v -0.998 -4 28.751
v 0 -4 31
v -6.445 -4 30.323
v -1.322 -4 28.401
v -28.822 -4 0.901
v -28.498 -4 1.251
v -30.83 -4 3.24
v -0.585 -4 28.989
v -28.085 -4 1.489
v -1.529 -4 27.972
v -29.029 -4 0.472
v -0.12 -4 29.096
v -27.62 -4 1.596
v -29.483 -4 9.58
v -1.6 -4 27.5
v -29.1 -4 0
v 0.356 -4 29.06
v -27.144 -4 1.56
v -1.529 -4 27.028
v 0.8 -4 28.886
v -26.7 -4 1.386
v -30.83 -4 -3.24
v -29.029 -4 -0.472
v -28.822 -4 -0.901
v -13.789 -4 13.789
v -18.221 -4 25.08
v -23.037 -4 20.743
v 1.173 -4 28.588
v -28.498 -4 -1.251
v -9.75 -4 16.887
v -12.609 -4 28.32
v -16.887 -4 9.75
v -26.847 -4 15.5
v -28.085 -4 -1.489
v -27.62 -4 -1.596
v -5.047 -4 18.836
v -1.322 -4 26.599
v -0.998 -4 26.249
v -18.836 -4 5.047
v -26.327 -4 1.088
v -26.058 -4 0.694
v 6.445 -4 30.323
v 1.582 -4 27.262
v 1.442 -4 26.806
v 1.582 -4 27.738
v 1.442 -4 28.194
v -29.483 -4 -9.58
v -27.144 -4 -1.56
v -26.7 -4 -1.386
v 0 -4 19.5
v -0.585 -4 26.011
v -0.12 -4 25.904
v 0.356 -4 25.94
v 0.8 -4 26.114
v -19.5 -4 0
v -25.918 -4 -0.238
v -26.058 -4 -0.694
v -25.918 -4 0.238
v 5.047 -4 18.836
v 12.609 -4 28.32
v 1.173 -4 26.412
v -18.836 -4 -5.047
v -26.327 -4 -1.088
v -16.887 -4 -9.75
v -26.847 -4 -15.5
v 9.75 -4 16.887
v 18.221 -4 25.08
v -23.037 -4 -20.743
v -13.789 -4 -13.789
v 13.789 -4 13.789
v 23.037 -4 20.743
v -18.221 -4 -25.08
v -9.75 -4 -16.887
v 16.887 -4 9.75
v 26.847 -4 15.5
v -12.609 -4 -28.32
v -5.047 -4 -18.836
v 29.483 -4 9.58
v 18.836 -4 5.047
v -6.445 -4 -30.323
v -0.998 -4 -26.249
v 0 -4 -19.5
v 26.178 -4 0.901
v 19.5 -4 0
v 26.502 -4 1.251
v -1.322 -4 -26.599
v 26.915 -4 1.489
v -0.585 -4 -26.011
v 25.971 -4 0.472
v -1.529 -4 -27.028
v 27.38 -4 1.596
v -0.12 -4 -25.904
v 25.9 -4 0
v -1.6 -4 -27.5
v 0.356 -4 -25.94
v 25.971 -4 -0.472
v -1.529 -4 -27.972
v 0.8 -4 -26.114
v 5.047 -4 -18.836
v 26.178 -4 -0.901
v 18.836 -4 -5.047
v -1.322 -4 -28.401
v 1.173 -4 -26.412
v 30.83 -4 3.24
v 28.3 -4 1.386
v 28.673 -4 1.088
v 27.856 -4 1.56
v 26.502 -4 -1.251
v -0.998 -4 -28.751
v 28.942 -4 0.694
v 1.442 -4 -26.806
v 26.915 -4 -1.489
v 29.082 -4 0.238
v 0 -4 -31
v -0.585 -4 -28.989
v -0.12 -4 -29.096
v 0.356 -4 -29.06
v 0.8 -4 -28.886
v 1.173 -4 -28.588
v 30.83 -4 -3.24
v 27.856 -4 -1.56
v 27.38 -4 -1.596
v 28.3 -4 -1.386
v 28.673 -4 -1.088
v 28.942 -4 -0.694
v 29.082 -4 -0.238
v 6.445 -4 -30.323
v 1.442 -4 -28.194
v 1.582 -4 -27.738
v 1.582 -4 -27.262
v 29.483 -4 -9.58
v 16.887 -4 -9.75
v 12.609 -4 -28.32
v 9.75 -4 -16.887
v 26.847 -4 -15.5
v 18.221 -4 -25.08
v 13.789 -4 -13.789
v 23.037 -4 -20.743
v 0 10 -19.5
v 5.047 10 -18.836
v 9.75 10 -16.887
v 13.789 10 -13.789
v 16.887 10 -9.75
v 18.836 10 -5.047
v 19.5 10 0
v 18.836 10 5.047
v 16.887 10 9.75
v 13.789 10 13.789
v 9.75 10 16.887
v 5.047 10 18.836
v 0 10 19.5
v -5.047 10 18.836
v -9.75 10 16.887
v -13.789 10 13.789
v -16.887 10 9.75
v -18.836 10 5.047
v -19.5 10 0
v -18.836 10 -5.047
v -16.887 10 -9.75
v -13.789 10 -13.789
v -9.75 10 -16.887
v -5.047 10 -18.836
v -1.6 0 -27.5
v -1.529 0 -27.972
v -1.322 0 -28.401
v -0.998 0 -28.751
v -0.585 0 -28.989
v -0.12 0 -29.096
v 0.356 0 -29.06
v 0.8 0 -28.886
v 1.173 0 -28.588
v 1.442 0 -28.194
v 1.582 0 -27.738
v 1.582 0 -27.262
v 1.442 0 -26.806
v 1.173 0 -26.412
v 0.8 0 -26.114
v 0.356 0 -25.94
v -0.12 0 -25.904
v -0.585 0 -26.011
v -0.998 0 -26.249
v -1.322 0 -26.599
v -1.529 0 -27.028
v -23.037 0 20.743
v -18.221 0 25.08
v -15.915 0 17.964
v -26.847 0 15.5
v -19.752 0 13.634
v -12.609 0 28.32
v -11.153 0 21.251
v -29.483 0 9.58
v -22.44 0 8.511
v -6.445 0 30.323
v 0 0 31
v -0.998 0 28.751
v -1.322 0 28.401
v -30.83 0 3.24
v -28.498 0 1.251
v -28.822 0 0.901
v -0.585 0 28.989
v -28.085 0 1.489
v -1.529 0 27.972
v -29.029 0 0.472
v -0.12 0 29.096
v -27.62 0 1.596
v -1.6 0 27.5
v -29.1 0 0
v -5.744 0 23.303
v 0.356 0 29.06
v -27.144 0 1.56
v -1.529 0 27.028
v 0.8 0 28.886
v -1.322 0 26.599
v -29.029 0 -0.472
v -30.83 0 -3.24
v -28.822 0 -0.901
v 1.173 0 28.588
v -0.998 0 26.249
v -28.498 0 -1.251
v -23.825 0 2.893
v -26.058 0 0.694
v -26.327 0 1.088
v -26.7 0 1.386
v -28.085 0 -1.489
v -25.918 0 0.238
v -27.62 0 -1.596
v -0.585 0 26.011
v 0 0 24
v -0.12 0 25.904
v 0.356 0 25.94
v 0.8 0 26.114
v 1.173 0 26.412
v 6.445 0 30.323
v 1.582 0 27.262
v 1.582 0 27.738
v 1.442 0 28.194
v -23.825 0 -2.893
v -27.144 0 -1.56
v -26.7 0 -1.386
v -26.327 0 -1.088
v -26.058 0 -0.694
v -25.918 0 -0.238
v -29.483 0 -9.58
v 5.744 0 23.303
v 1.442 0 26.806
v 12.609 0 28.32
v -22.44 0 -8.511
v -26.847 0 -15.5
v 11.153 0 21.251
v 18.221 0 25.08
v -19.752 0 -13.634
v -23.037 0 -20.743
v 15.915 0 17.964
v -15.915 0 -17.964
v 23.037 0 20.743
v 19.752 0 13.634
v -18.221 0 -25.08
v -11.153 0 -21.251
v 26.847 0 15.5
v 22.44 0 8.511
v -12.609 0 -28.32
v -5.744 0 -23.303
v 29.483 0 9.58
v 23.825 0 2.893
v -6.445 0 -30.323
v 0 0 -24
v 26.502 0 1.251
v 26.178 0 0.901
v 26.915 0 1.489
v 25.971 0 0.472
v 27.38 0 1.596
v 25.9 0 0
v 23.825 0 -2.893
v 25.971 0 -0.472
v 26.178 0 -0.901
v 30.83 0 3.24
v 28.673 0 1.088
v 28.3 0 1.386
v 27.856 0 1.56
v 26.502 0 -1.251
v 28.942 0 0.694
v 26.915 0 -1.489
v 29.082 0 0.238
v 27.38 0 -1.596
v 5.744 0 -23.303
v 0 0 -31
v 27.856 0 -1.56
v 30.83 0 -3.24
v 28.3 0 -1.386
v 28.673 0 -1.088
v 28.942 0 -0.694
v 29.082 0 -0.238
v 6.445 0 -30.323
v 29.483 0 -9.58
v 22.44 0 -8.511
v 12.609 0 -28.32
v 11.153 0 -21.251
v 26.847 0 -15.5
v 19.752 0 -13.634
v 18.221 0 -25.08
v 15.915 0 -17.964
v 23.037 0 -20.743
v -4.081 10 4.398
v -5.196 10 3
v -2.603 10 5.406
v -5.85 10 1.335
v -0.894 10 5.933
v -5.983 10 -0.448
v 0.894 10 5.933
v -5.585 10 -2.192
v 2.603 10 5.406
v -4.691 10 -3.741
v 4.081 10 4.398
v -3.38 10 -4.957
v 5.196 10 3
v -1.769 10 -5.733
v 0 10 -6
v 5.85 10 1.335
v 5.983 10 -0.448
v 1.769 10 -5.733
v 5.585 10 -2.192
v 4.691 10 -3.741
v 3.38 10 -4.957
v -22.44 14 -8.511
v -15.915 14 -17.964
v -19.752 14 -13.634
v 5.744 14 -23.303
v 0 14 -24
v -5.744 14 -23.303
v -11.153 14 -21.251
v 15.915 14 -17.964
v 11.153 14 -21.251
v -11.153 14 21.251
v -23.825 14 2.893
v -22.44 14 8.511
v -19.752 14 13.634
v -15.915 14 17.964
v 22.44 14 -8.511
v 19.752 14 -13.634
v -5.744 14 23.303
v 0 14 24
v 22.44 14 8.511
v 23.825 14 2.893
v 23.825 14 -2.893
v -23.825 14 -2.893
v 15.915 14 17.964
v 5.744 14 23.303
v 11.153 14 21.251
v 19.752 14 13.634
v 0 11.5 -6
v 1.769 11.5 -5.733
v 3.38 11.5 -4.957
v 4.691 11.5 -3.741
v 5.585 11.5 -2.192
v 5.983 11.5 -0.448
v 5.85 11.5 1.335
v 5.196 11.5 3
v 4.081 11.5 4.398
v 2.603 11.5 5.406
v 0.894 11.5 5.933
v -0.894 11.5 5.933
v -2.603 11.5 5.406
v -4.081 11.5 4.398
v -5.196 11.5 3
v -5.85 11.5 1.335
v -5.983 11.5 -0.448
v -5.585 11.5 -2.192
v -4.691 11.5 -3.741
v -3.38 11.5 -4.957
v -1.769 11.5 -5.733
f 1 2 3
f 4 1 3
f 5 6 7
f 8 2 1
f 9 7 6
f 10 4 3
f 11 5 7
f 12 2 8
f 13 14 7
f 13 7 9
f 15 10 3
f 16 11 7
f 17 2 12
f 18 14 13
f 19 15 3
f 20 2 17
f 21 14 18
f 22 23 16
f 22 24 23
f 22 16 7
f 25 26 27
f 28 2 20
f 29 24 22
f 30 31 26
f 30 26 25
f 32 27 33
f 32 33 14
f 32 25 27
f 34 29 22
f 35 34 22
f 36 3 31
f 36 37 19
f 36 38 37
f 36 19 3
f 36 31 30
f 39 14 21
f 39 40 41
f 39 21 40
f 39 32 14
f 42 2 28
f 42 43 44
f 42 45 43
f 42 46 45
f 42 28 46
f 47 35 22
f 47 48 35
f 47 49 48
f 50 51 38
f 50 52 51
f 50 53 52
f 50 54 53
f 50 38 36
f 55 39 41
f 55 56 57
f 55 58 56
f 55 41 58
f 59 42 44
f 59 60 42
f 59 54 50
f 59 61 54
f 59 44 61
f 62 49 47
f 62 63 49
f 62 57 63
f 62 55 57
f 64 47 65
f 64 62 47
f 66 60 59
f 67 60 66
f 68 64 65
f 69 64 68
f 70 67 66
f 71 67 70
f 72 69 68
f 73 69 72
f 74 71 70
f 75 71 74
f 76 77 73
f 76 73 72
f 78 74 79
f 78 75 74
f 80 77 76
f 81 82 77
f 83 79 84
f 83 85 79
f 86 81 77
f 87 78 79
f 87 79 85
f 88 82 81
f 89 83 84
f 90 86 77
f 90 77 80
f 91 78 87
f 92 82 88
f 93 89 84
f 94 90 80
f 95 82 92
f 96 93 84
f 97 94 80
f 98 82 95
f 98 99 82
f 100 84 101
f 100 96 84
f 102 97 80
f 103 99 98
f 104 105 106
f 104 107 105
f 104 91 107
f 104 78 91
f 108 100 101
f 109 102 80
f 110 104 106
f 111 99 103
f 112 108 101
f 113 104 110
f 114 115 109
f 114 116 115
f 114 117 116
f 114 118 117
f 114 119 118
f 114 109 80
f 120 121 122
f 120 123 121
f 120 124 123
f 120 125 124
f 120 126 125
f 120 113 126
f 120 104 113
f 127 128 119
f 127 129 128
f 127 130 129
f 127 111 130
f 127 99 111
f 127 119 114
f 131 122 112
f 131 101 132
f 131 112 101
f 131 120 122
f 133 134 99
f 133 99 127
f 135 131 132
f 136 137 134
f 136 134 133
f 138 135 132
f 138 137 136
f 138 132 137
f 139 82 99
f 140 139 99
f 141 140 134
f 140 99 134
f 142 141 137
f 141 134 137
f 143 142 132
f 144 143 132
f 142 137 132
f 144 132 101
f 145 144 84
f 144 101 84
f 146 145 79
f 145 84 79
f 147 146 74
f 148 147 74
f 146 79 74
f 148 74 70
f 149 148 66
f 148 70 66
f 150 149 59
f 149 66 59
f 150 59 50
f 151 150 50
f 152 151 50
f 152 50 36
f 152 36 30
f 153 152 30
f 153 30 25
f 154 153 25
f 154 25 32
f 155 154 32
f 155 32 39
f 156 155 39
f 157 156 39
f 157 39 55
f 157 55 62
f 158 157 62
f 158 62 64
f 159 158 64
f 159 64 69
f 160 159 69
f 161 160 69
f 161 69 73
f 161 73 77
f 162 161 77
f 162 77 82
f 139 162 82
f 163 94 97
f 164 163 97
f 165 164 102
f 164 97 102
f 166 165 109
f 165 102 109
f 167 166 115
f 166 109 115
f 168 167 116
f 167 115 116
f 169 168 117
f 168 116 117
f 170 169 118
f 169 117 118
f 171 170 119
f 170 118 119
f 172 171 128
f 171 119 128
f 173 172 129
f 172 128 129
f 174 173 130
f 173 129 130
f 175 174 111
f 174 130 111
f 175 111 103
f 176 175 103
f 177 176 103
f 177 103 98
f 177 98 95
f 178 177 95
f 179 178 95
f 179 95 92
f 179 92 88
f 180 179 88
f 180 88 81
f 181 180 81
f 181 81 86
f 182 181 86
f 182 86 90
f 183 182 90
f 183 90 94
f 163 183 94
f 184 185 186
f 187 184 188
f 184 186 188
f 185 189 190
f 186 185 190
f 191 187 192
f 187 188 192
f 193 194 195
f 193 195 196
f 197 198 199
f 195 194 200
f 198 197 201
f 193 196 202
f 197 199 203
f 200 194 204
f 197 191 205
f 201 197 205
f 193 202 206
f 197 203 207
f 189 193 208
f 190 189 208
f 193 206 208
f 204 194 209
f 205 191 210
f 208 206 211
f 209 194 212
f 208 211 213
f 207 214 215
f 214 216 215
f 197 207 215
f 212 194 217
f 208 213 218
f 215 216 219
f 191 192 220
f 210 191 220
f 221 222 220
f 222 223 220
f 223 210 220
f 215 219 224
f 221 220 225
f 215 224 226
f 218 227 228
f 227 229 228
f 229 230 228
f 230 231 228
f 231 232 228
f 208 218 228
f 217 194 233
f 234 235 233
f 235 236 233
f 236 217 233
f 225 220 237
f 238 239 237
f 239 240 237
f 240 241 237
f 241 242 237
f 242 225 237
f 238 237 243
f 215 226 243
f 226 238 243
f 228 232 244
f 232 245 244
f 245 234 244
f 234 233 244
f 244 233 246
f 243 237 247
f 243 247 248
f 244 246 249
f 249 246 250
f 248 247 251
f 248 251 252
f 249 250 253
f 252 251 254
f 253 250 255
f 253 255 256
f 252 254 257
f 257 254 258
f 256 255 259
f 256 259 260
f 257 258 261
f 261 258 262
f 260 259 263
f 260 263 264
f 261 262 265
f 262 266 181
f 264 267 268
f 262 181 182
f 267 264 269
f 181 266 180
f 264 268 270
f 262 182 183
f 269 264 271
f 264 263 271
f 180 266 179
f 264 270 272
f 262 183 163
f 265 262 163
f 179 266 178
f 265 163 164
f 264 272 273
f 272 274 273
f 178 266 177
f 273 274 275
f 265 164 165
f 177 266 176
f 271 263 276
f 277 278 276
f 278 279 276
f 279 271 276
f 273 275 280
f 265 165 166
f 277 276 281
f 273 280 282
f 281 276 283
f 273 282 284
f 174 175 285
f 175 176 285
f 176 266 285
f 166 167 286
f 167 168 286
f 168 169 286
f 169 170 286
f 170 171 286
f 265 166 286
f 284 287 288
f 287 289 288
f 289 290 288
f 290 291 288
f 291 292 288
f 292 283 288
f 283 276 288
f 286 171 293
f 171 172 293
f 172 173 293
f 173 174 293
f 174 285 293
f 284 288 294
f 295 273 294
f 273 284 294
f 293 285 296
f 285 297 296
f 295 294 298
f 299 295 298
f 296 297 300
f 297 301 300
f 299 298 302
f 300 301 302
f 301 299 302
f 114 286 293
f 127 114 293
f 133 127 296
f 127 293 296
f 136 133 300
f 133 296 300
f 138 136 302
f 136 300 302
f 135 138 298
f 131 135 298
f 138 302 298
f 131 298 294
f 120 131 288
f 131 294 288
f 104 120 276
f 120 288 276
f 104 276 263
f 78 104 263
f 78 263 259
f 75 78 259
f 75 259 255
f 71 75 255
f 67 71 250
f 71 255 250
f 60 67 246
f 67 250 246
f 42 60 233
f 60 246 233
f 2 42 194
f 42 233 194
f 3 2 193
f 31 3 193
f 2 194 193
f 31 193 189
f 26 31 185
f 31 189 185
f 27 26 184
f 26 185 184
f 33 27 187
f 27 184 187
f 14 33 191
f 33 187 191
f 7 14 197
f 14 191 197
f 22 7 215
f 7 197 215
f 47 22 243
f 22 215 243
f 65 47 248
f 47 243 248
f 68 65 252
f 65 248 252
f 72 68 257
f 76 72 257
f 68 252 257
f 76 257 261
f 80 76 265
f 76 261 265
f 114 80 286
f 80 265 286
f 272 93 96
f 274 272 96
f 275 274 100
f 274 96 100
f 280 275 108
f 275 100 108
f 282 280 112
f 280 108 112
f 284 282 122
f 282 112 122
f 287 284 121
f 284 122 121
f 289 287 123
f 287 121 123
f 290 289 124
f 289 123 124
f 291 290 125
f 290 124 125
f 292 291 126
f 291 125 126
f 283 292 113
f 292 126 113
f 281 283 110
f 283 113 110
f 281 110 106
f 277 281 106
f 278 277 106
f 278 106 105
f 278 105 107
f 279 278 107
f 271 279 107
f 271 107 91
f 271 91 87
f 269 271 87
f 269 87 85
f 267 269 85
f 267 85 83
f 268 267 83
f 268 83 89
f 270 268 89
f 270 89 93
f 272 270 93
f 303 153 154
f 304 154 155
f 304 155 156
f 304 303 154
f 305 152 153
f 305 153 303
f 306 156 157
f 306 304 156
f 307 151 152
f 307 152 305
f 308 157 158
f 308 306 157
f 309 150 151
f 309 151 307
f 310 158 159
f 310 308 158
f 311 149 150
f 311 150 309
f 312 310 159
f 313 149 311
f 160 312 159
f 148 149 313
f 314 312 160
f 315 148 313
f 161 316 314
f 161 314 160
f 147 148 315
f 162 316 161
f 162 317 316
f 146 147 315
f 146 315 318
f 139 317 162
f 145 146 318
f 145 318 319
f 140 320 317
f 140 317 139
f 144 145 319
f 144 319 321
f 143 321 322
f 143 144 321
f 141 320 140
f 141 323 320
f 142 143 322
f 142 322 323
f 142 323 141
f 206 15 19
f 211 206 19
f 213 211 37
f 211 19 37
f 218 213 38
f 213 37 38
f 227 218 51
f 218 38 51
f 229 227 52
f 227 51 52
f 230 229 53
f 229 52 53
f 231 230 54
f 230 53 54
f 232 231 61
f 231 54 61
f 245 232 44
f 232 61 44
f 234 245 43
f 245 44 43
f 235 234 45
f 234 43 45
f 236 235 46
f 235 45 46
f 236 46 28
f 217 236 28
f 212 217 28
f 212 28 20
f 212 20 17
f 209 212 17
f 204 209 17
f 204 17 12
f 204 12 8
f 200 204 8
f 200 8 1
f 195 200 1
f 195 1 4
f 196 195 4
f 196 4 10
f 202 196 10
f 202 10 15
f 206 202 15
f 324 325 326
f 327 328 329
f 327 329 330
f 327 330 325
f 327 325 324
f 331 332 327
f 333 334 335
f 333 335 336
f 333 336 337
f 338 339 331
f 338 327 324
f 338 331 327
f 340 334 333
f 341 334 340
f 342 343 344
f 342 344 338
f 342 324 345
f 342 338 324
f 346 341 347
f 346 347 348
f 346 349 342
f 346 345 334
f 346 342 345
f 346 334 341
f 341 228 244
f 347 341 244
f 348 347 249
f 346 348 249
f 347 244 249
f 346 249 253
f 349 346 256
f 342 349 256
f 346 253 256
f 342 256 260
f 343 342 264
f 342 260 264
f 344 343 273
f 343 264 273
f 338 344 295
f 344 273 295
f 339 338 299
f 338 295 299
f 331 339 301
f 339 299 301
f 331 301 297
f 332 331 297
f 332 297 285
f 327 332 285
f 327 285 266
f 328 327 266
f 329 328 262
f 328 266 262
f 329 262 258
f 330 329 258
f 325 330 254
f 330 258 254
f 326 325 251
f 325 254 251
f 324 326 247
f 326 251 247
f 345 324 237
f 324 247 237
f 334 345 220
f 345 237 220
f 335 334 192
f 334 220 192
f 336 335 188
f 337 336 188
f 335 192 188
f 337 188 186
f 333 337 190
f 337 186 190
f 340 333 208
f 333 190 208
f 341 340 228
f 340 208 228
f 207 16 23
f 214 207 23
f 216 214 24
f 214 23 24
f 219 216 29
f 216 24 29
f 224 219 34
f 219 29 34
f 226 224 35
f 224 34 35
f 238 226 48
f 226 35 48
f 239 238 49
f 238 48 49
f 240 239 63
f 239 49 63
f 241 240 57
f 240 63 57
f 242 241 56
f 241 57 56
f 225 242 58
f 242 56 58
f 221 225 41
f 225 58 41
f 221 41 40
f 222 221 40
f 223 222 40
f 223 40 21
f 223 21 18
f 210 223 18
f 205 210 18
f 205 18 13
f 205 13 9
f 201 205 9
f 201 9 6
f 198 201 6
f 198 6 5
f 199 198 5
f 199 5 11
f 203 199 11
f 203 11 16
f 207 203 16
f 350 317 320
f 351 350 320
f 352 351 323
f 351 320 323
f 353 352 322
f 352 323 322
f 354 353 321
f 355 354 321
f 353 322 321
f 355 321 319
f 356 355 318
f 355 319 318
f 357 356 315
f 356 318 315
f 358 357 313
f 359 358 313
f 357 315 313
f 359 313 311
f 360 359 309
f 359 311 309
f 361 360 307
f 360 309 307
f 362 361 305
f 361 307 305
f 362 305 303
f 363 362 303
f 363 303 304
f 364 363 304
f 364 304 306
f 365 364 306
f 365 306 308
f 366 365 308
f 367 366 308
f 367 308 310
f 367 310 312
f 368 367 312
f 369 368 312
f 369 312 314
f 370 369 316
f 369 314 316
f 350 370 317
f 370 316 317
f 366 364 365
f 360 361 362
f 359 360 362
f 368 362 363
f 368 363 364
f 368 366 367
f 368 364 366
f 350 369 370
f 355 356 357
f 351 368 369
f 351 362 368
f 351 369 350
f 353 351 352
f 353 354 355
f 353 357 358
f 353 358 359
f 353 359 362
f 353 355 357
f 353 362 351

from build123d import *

# Parameters (mm, degrees)
SKETCH1_R                  = 24
BOSS_EXTRUDE1_DEPTH        = 14
SKETCH2_R                  = 19.5
CUT_EXTRUDE1_DEPTH         = 10
SKETCH3_R                  = 6
CUT_EXTRUDE2_DEPTH         = 1.5
SKETCH4_R                  = 31
BOSS_EXTRUDE2_DEPTH        = 4
SKETCH5_R                  = 19.5
CUT_EXTRUDE3_DEPTH         = 4
F_3_2_3_2_DIAMETER_HOLE1_D = 3.2


with BuildPart() as part:
    # Sketch1 → Boss-Extrude1 (new body)
    with BuildSketch(Plane(origin=(0, 0, 0), x_dir=(1, 0, 0), z_dir=(0, 1, 0))):
        with Locations(Location((0, 0, 0), (0, 0, 270))):
            Circle(SKETCH1_R)
    extrude(amount=BOSS_EXTRUDE1_DEPTH)

    # Sketch2 → Cut-Extrude1 (cut)
    with BuildSketch(Plane.XZ):
        with Locations(Location((0, 0, 0), (0, 0, 270))):
            Circle(SKETCH2_R)
    extrude(amount=-CUT_EXTRUDE1_DEPTH, mode=Mode.SUBTRACT)

    # Sketch3 → Cut-Extrude2 (cut)
    with BuildSketch(Plane.XZ.offset(-10)):
        with Locations(Location((0, 0, 0), (0, 0, 270))):
            Circle(SKETCH3_R)
    extrude(amount=-CUT_EXTRUDE2_DEPTH, mode=Mode.SUBTRACT)

    # Sketch4 → Boss-Extrude2 (add)
    with BuildSketch(Plane.XZ):
        with Locations(Location((0, 0, 0), (0, 0, 270))):
            Circle(SKETCH4_R)
    extrude(amount=BOSS_EXTRUDE2_DEPTH)

    # Sketch5 → Cut-Extrude3 (cut)
    with BuildSketch(Plane.XZ.offset(4)):
        with Locations(Location((0, 0, 0), (0, 0, 270))):
            Circle(SKETCH5_R)
    extrude(amount=-CUT_EXTRUDE3_DEPTH, mode=Mode.SUBTRACT)

    # Ø3.2 (3.2) Diameter Hole1 (through all)
    with Locations(Plane(origin=(0, 0, 0), x_dir=(1, 0, 0), z_dir=(0, 1, 0))):
        with Locations((-27.5, 0), (0, 27.5), (27.5, 0), (0, -27.5)):
            Hole(F_3_2_3_2_DIAMETER_HOLE1_D / 2)


solid = part.part
